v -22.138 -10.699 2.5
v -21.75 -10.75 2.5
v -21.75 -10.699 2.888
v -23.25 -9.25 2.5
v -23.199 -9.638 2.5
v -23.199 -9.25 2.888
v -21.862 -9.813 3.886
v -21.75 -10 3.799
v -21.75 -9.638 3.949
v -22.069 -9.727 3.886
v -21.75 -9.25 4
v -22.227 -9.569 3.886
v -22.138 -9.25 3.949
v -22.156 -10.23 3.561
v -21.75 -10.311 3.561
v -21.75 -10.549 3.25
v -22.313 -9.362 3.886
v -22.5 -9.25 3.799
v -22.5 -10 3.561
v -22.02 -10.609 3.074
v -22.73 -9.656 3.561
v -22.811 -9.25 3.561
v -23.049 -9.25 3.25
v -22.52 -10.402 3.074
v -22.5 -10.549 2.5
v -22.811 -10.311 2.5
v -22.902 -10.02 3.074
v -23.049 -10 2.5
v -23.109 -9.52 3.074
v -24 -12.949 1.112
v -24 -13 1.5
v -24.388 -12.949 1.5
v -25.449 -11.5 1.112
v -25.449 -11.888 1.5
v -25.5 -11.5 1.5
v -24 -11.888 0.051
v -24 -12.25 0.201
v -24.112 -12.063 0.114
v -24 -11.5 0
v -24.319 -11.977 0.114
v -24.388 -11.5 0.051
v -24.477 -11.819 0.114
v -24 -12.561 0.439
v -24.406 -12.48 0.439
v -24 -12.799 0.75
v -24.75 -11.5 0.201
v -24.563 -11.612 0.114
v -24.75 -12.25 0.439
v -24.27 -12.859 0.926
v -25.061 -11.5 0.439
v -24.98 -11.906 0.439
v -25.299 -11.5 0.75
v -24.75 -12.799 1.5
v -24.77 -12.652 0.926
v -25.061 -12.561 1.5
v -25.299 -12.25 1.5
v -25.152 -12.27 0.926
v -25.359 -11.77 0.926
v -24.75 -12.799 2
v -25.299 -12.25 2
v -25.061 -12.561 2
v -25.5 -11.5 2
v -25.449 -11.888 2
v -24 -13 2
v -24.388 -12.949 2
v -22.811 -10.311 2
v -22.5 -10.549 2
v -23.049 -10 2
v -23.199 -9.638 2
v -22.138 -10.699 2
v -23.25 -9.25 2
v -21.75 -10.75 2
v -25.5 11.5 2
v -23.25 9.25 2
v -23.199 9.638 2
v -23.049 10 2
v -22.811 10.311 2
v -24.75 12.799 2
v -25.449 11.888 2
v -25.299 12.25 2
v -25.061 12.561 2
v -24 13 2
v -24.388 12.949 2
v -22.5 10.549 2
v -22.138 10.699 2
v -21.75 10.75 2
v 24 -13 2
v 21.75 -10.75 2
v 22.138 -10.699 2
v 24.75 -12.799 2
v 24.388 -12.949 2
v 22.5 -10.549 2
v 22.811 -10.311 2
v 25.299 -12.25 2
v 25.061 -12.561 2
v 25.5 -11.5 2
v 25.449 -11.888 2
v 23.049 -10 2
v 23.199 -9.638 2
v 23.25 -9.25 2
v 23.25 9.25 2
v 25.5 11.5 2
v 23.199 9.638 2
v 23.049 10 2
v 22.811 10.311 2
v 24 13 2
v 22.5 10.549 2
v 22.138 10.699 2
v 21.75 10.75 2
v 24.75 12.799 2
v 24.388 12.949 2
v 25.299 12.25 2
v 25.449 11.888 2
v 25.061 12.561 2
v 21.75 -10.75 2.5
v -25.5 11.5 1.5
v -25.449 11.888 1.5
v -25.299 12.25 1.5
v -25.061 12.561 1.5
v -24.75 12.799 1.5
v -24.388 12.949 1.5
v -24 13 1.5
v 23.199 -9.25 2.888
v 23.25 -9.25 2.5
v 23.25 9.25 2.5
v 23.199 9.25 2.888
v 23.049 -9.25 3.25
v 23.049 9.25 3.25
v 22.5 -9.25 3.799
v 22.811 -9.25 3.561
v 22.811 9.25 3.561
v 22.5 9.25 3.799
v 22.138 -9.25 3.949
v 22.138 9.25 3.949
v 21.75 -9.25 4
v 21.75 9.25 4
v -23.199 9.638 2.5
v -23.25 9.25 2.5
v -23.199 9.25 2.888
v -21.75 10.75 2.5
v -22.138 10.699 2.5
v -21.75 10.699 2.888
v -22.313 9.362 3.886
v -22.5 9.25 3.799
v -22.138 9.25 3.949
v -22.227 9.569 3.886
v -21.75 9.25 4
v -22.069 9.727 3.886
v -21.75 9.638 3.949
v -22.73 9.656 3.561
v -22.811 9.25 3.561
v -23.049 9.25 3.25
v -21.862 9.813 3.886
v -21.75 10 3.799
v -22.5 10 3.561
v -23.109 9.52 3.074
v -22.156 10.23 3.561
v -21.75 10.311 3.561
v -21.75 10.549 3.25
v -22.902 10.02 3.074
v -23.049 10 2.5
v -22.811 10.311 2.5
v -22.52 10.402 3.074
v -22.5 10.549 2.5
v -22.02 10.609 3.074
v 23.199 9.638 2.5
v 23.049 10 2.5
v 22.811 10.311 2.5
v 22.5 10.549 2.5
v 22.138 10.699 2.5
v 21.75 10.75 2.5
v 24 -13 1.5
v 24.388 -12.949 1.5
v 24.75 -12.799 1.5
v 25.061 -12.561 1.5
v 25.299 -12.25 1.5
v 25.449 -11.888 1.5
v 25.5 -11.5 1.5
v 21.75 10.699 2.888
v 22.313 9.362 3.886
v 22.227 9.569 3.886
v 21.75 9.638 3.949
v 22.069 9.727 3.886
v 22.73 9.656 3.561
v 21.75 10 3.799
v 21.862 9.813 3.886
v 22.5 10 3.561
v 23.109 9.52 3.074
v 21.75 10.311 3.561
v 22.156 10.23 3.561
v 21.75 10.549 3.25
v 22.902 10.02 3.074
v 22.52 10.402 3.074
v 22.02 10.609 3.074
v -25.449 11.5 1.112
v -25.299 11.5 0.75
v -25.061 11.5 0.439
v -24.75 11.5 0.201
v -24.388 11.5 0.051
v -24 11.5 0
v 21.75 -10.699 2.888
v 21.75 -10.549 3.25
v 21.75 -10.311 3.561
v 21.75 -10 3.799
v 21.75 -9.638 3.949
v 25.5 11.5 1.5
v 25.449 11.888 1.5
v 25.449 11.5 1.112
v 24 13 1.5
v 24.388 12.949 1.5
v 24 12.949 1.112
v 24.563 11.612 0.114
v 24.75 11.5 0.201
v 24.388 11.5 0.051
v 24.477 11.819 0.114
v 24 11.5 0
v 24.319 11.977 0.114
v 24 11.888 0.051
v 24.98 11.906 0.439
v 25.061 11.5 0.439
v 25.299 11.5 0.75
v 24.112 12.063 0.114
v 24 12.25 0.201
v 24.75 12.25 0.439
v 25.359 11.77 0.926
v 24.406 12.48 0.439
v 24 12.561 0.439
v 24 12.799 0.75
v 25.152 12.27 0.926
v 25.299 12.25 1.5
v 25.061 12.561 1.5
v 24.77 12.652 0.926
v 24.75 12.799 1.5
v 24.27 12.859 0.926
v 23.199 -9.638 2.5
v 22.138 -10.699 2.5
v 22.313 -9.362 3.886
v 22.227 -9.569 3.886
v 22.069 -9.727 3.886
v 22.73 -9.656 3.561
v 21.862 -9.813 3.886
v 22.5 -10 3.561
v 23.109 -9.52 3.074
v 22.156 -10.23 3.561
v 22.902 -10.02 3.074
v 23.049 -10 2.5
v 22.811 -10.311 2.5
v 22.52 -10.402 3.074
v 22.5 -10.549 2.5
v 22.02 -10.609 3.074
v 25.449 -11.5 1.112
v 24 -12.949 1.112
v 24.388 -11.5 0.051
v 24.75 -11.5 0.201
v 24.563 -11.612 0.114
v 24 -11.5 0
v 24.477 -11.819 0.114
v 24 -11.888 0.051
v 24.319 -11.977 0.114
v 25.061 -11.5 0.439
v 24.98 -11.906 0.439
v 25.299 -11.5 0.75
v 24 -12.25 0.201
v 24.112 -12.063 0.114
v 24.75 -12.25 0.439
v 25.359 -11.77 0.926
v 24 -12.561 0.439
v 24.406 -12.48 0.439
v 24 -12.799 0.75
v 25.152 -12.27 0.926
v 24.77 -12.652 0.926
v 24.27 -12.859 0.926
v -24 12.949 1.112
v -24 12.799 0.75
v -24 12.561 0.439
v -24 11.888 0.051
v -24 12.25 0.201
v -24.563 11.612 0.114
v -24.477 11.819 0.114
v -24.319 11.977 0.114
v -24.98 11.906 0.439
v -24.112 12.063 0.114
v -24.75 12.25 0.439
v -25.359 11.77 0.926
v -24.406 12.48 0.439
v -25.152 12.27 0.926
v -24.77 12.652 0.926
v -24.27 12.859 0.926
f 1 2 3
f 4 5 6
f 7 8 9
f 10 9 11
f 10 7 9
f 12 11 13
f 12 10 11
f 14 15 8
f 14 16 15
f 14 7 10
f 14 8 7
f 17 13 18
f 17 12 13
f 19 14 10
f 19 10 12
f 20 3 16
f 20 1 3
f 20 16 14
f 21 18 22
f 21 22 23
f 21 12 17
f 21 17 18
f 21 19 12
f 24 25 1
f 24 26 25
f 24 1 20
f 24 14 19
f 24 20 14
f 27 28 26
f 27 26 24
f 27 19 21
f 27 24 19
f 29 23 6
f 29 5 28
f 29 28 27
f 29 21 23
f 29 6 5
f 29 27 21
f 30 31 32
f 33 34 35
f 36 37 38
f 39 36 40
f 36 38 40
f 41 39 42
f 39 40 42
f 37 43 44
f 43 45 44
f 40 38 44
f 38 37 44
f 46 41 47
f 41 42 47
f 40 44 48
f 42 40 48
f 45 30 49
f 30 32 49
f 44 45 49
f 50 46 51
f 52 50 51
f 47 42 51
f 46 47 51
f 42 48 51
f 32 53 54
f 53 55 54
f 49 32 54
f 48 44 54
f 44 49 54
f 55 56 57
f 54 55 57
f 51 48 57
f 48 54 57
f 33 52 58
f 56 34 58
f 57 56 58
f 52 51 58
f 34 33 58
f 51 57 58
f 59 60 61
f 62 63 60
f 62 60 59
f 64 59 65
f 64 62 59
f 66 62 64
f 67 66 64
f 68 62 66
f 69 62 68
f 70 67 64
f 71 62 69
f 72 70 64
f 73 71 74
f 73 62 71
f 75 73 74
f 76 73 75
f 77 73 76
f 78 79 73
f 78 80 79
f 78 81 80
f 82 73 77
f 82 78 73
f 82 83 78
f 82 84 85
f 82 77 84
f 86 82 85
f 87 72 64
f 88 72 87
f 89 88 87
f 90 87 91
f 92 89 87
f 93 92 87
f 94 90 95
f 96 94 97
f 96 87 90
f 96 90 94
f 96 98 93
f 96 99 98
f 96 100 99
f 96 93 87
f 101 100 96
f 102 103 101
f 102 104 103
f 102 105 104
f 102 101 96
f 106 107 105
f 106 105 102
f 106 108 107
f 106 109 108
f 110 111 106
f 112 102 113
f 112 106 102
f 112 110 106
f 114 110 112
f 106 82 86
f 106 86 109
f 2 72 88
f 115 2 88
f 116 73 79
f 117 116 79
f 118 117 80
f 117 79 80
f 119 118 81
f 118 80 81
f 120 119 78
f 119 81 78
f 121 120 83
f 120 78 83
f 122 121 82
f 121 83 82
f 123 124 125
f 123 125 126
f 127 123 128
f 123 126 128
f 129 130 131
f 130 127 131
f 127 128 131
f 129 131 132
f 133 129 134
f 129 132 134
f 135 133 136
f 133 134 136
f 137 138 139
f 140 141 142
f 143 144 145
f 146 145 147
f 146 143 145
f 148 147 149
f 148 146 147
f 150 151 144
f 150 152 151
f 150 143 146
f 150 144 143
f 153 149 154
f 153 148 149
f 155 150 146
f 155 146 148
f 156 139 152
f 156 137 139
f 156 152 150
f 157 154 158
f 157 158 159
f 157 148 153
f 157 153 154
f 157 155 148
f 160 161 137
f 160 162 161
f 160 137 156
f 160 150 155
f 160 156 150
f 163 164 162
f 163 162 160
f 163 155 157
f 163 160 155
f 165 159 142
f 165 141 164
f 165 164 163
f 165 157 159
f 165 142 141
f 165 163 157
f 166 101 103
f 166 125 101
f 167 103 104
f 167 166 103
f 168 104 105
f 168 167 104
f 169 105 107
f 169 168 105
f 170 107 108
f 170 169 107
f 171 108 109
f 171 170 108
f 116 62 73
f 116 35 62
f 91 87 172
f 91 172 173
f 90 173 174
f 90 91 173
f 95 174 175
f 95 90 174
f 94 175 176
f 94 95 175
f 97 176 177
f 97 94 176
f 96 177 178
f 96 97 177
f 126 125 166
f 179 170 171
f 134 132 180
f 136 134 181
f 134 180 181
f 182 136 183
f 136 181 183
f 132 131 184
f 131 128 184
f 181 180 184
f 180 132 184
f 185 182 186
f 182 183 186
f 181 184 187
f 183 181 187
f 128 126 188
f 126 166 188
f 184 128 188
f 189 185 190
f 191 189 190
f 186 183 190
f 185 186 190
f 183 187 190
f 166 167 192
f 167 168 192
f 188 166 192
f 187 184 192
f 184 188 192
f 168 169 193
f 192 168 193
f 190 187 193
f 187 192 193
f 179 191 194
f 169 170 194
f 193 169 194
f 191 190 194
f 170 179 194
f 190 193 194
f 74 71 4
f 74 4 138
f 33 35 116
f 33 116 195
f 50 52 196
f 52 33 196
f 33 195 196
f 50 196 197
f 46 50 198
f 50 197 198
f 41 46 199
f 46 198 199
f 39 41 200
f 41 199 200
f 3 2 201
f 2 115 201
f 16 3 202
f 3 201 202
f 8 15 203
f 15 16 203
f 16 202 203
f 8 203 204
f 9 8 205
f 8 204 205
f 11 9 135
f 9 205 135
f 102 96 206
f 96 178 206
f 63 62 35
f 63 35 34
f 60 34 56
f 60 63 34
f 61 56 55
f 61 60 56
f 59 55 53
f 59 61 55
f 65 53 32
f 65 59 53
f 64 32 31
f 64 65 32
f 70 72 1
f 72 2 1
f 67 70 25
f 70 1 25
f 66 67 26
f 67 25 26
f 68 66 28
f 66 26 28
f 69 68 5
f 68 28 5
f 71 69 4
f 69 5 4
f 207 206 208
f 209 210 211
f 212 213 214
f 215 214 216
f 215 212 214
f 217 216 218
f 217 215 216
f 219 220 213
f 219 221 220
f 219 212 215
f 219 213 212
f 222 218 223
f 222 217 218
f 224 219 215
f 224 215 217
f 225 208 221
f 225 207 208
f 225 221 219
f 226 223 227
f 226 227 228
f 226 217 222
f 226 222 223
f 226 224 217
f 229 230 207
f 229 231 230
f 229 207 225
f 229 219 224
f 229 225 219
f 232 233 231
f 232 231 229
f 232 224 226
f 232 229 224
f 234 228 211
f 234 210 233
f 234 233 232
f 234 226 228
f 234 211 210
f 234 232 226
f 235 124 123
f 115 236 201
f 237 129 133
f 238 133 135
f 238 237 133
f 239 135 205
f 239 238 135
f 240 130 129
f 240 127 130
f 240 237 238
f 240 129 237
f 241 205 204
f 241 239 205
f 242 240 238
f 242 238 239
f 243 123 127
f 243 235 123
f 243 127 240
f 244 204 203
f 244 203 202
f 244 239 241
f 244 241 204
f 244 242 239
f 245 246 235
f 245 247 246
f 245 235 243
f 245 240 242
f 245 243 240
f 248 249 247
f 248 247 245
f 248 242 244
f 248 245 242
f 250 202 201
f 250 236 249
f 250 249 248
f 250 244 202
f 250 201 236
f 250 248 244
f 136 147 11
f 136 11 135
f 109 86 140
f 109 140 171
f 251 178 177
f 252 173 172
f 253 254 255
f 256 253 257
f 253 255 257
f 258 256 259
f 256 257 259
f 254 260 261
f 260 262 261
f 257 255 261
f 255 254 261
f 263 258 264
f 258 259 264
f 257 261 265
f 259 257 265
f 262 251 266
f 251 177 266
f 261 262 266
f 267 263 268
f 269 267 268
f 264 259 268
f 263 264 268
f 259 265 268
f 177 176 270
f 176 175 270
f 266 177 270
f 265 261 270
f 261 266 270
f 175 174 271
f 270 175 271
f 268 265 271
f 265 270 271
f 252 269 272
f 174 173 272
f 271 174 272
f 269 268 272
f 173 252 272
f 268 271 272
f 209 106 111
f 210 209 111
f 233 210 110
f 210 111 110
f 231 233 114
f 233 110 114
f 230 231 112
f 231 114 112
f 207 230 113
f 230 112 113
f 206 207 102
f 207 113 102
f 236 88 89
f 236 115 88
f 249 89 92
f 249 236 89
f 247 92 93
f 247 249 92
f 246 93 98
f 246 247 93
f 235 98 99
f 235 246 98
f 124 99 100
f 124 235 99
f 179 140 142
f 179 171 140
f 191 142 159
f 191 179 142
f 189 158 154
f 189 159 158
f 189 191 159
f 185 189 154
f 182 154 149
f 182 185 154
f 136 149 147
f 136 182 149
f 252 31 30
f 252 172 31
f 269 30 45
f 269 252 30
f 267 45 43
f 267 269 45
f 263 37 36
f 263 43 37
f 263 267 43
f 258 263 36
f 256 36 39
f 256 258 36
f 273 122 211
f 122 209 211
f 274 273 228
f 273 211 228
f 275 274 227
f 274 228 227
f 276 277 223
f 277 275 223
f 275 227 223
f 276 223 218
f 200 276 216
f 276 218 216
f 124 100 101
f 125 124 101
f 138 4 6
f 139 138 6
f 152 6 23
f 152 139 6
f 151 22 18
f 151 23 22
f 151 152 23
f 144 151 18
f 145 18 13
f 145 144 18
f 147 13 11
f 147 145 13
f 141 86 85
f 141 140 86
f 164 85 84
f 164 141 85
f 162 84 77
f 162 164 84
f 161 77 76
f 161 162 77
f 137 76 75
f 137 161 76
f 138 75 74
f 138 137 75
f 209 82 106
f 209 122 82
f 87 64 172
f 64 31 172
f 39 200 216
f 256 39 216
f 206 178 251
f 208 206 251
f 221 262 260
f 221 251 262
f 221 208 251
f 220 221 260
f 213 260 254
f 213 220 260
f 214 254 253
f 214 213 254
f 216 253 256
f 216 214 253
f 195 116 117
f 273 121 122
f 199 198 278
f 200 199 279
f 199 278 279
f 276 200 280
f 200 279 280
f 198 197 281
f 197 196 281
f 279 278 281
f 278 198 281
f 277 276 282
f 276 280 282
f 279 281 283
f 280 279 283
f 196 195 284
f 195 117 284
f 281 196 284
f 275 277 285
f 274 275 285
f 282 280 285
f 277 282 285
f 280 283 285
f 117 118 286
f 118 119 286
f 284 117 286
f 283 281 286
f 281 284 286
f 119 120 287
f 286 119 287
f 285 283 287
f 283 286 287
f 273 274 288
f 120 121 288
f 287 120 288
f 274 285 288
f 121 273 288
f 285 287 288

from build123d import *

# Parameters (mm, degrees)
F0_W     = 51
F0_H     = 26
F0_W_2   = 46.5
F0_H_2   = 21.5
F1_DEPTH = 2
F2_DEPTH = 4
F3_R     = 1.5
F4_R     = 1.5


with BuildPart() as f1:
    # F0 (on Top) → F1 (new body)
    with BuildSketch(Plane.XY):
        Rectangle(F0_W, F0_H)
        Rectangle(F0_W_2, F0_H_2, mode=Mode.SUBTRACT)
    extrude(amount=F1_DEPTH)

    # F0 (on Top) → F2 (join)
    with BuildSketch(Plane.XY):
        Rectangle(F0_W_2, F0_H_2)
    extrude(amount=F2_DEPTH)

    # F3
    f3_edges = [f1.edges().sort_by_distance(p)[0] for p in [
        (25.5, 13, 1),
        (-25.5, 13, 1),
        (-25.5, -13, 1),
        (25.5, -13, 1),
        (25.5, 0, 0),
        (0, -13, 0),
        (-25.5, 0, 0),
        (0, 13, 0),
    ]]
    fillet(f3_edges, radius=F3_R)

    # F4
    f4_edges = [f1.edges().sort_by_distance(p)[0] for p in [
        (-23.25, -10.75, 3),
        (-23.25, 10.75, 3),
        (23.25, 10.75, 3),
        (23.25, -10.75, 3),
        (23.25, 0, 4),
        (0, -10.75, 4),
        (-23.25, 0, 4),
        (0, 10.75, 4),
    ]]
    fillet(f4_edges, radius=F4_R)


solid = f1.part
